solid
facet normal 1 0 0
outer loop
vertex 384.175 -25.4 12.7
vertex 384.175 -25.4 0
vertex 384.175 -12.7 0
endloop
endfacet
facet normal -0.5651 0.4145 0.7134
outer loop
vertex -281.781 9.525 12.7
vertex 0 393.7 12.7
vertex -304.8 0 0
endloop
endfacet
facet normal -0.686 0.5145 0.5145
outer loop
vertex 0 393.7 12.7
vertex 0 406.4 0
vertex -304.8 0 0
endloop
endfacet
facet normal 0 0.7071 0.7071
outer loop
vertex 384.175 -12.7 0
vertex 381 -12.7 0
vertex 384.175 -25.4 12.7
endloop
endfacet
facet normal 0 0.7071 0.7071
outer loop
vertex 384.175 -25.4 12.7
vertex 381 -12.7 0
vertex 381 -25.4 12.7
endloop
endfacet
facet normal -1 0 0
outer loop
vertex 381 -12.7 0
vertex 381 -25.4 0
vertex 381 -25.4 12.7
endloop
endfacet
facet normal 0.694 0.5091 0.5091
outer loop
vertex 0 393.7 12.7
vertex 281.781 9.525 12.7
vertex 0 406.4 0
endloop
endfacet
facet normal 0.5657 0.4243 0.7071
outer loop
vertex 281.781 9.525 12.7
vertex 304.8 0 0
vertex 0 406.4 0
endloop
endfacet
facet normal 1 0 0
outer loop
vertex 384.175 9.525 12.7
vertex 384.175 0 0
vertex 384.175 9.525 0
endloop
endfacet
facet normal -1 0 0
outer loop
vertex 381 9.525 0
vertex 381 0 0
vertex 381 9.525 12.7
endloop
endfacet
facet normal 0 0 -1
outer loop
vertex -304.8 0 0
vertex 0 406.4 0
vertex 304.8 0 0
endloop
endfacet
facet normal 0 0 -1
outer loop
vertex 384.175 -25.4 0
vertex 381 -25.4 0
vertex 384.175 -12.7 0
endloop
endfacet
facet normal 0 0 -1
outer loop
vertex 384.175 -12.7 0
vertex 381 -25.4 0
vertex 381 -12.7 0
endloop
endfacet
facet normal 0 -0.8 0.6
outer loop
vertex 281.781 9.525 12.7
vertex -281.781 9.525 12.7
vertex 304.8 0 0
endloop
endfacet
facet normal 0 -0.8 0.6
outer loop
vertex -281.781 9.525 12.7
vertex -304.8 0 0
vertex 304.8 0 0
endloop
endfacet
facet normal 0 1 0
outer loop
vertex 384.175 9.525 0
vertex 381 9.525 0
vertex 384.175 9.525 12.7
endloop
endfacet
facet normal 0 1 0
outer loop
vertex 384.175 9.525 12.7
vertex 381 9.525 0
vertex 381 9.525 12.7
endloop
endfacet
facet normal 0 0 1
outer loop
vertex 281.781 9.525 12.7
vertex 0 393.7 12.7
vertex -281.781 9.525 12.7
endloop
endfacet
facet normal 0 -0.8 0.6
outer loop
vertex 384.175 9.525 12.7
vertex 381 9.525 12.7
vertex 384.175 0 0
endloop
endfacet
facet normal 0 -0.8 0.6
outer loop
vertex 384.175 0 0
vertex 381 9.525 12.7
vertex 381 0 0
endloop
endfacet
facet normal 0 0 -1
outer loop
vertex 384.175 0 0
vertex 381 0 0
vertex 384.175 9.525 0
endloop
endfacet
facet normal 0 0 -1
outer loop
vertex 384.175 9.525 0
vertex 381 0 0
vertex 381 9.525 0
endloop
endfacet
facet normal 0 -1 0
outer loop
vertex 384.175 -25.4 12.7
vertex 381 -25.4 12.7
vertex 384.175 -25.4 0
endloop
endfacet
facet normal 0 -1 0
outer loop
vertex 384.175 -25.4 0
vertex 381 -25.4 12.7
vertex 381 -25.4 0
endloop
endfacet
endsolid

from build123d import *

# Parameters (mm, degrees)
F10_DEPTH = 3.175


# Not quite as in the source:
# - a length typed as a fraction of an inch, garbled in the dataset ("3 / 203.2 mm" for 3/8 in), is restored


with BuildPart() as f7:
    # F6 (on offset) → F7 section 0
    with BuildSketch(Plane.XY.offset(12.7)):
        Polygon((0, 393.7), (-281.7812500119, 9.5249999841), (0, 9.5249999841), (281.7812500119, 9.5249999841), align=None)
    # F1 (on Top) → F7 section 1
    with BuildSketch(Plane.XY):
        Polygon((-304.8, 0), (0, 0), (304.8, 0), (0, 406.4), align=None)
    loft()


with BuildPart() as f10:
    # F9 (on offset) → F10 (new body)
    with BuildSketch(Plane.YZ.offset(381)):
        Polygon((9.5249999841, 0), (9.5249999841, 12.7), (0, 0), align=None)
    extrude(amount=F10_DEPTH)


with BuildPart() as f10b:
    # F9 (on offset) → F10, piece 2 (new body)
    with BuildSketch(Plane.YZ.offset(381)):
        Polygon((-25.4, 0), (-12.7, 0), (-25.4, 12.7), align=None)
    extrude(amount=F10_DEPTH)


solid = Compound([f7.part, f10.part, f10b.part])
